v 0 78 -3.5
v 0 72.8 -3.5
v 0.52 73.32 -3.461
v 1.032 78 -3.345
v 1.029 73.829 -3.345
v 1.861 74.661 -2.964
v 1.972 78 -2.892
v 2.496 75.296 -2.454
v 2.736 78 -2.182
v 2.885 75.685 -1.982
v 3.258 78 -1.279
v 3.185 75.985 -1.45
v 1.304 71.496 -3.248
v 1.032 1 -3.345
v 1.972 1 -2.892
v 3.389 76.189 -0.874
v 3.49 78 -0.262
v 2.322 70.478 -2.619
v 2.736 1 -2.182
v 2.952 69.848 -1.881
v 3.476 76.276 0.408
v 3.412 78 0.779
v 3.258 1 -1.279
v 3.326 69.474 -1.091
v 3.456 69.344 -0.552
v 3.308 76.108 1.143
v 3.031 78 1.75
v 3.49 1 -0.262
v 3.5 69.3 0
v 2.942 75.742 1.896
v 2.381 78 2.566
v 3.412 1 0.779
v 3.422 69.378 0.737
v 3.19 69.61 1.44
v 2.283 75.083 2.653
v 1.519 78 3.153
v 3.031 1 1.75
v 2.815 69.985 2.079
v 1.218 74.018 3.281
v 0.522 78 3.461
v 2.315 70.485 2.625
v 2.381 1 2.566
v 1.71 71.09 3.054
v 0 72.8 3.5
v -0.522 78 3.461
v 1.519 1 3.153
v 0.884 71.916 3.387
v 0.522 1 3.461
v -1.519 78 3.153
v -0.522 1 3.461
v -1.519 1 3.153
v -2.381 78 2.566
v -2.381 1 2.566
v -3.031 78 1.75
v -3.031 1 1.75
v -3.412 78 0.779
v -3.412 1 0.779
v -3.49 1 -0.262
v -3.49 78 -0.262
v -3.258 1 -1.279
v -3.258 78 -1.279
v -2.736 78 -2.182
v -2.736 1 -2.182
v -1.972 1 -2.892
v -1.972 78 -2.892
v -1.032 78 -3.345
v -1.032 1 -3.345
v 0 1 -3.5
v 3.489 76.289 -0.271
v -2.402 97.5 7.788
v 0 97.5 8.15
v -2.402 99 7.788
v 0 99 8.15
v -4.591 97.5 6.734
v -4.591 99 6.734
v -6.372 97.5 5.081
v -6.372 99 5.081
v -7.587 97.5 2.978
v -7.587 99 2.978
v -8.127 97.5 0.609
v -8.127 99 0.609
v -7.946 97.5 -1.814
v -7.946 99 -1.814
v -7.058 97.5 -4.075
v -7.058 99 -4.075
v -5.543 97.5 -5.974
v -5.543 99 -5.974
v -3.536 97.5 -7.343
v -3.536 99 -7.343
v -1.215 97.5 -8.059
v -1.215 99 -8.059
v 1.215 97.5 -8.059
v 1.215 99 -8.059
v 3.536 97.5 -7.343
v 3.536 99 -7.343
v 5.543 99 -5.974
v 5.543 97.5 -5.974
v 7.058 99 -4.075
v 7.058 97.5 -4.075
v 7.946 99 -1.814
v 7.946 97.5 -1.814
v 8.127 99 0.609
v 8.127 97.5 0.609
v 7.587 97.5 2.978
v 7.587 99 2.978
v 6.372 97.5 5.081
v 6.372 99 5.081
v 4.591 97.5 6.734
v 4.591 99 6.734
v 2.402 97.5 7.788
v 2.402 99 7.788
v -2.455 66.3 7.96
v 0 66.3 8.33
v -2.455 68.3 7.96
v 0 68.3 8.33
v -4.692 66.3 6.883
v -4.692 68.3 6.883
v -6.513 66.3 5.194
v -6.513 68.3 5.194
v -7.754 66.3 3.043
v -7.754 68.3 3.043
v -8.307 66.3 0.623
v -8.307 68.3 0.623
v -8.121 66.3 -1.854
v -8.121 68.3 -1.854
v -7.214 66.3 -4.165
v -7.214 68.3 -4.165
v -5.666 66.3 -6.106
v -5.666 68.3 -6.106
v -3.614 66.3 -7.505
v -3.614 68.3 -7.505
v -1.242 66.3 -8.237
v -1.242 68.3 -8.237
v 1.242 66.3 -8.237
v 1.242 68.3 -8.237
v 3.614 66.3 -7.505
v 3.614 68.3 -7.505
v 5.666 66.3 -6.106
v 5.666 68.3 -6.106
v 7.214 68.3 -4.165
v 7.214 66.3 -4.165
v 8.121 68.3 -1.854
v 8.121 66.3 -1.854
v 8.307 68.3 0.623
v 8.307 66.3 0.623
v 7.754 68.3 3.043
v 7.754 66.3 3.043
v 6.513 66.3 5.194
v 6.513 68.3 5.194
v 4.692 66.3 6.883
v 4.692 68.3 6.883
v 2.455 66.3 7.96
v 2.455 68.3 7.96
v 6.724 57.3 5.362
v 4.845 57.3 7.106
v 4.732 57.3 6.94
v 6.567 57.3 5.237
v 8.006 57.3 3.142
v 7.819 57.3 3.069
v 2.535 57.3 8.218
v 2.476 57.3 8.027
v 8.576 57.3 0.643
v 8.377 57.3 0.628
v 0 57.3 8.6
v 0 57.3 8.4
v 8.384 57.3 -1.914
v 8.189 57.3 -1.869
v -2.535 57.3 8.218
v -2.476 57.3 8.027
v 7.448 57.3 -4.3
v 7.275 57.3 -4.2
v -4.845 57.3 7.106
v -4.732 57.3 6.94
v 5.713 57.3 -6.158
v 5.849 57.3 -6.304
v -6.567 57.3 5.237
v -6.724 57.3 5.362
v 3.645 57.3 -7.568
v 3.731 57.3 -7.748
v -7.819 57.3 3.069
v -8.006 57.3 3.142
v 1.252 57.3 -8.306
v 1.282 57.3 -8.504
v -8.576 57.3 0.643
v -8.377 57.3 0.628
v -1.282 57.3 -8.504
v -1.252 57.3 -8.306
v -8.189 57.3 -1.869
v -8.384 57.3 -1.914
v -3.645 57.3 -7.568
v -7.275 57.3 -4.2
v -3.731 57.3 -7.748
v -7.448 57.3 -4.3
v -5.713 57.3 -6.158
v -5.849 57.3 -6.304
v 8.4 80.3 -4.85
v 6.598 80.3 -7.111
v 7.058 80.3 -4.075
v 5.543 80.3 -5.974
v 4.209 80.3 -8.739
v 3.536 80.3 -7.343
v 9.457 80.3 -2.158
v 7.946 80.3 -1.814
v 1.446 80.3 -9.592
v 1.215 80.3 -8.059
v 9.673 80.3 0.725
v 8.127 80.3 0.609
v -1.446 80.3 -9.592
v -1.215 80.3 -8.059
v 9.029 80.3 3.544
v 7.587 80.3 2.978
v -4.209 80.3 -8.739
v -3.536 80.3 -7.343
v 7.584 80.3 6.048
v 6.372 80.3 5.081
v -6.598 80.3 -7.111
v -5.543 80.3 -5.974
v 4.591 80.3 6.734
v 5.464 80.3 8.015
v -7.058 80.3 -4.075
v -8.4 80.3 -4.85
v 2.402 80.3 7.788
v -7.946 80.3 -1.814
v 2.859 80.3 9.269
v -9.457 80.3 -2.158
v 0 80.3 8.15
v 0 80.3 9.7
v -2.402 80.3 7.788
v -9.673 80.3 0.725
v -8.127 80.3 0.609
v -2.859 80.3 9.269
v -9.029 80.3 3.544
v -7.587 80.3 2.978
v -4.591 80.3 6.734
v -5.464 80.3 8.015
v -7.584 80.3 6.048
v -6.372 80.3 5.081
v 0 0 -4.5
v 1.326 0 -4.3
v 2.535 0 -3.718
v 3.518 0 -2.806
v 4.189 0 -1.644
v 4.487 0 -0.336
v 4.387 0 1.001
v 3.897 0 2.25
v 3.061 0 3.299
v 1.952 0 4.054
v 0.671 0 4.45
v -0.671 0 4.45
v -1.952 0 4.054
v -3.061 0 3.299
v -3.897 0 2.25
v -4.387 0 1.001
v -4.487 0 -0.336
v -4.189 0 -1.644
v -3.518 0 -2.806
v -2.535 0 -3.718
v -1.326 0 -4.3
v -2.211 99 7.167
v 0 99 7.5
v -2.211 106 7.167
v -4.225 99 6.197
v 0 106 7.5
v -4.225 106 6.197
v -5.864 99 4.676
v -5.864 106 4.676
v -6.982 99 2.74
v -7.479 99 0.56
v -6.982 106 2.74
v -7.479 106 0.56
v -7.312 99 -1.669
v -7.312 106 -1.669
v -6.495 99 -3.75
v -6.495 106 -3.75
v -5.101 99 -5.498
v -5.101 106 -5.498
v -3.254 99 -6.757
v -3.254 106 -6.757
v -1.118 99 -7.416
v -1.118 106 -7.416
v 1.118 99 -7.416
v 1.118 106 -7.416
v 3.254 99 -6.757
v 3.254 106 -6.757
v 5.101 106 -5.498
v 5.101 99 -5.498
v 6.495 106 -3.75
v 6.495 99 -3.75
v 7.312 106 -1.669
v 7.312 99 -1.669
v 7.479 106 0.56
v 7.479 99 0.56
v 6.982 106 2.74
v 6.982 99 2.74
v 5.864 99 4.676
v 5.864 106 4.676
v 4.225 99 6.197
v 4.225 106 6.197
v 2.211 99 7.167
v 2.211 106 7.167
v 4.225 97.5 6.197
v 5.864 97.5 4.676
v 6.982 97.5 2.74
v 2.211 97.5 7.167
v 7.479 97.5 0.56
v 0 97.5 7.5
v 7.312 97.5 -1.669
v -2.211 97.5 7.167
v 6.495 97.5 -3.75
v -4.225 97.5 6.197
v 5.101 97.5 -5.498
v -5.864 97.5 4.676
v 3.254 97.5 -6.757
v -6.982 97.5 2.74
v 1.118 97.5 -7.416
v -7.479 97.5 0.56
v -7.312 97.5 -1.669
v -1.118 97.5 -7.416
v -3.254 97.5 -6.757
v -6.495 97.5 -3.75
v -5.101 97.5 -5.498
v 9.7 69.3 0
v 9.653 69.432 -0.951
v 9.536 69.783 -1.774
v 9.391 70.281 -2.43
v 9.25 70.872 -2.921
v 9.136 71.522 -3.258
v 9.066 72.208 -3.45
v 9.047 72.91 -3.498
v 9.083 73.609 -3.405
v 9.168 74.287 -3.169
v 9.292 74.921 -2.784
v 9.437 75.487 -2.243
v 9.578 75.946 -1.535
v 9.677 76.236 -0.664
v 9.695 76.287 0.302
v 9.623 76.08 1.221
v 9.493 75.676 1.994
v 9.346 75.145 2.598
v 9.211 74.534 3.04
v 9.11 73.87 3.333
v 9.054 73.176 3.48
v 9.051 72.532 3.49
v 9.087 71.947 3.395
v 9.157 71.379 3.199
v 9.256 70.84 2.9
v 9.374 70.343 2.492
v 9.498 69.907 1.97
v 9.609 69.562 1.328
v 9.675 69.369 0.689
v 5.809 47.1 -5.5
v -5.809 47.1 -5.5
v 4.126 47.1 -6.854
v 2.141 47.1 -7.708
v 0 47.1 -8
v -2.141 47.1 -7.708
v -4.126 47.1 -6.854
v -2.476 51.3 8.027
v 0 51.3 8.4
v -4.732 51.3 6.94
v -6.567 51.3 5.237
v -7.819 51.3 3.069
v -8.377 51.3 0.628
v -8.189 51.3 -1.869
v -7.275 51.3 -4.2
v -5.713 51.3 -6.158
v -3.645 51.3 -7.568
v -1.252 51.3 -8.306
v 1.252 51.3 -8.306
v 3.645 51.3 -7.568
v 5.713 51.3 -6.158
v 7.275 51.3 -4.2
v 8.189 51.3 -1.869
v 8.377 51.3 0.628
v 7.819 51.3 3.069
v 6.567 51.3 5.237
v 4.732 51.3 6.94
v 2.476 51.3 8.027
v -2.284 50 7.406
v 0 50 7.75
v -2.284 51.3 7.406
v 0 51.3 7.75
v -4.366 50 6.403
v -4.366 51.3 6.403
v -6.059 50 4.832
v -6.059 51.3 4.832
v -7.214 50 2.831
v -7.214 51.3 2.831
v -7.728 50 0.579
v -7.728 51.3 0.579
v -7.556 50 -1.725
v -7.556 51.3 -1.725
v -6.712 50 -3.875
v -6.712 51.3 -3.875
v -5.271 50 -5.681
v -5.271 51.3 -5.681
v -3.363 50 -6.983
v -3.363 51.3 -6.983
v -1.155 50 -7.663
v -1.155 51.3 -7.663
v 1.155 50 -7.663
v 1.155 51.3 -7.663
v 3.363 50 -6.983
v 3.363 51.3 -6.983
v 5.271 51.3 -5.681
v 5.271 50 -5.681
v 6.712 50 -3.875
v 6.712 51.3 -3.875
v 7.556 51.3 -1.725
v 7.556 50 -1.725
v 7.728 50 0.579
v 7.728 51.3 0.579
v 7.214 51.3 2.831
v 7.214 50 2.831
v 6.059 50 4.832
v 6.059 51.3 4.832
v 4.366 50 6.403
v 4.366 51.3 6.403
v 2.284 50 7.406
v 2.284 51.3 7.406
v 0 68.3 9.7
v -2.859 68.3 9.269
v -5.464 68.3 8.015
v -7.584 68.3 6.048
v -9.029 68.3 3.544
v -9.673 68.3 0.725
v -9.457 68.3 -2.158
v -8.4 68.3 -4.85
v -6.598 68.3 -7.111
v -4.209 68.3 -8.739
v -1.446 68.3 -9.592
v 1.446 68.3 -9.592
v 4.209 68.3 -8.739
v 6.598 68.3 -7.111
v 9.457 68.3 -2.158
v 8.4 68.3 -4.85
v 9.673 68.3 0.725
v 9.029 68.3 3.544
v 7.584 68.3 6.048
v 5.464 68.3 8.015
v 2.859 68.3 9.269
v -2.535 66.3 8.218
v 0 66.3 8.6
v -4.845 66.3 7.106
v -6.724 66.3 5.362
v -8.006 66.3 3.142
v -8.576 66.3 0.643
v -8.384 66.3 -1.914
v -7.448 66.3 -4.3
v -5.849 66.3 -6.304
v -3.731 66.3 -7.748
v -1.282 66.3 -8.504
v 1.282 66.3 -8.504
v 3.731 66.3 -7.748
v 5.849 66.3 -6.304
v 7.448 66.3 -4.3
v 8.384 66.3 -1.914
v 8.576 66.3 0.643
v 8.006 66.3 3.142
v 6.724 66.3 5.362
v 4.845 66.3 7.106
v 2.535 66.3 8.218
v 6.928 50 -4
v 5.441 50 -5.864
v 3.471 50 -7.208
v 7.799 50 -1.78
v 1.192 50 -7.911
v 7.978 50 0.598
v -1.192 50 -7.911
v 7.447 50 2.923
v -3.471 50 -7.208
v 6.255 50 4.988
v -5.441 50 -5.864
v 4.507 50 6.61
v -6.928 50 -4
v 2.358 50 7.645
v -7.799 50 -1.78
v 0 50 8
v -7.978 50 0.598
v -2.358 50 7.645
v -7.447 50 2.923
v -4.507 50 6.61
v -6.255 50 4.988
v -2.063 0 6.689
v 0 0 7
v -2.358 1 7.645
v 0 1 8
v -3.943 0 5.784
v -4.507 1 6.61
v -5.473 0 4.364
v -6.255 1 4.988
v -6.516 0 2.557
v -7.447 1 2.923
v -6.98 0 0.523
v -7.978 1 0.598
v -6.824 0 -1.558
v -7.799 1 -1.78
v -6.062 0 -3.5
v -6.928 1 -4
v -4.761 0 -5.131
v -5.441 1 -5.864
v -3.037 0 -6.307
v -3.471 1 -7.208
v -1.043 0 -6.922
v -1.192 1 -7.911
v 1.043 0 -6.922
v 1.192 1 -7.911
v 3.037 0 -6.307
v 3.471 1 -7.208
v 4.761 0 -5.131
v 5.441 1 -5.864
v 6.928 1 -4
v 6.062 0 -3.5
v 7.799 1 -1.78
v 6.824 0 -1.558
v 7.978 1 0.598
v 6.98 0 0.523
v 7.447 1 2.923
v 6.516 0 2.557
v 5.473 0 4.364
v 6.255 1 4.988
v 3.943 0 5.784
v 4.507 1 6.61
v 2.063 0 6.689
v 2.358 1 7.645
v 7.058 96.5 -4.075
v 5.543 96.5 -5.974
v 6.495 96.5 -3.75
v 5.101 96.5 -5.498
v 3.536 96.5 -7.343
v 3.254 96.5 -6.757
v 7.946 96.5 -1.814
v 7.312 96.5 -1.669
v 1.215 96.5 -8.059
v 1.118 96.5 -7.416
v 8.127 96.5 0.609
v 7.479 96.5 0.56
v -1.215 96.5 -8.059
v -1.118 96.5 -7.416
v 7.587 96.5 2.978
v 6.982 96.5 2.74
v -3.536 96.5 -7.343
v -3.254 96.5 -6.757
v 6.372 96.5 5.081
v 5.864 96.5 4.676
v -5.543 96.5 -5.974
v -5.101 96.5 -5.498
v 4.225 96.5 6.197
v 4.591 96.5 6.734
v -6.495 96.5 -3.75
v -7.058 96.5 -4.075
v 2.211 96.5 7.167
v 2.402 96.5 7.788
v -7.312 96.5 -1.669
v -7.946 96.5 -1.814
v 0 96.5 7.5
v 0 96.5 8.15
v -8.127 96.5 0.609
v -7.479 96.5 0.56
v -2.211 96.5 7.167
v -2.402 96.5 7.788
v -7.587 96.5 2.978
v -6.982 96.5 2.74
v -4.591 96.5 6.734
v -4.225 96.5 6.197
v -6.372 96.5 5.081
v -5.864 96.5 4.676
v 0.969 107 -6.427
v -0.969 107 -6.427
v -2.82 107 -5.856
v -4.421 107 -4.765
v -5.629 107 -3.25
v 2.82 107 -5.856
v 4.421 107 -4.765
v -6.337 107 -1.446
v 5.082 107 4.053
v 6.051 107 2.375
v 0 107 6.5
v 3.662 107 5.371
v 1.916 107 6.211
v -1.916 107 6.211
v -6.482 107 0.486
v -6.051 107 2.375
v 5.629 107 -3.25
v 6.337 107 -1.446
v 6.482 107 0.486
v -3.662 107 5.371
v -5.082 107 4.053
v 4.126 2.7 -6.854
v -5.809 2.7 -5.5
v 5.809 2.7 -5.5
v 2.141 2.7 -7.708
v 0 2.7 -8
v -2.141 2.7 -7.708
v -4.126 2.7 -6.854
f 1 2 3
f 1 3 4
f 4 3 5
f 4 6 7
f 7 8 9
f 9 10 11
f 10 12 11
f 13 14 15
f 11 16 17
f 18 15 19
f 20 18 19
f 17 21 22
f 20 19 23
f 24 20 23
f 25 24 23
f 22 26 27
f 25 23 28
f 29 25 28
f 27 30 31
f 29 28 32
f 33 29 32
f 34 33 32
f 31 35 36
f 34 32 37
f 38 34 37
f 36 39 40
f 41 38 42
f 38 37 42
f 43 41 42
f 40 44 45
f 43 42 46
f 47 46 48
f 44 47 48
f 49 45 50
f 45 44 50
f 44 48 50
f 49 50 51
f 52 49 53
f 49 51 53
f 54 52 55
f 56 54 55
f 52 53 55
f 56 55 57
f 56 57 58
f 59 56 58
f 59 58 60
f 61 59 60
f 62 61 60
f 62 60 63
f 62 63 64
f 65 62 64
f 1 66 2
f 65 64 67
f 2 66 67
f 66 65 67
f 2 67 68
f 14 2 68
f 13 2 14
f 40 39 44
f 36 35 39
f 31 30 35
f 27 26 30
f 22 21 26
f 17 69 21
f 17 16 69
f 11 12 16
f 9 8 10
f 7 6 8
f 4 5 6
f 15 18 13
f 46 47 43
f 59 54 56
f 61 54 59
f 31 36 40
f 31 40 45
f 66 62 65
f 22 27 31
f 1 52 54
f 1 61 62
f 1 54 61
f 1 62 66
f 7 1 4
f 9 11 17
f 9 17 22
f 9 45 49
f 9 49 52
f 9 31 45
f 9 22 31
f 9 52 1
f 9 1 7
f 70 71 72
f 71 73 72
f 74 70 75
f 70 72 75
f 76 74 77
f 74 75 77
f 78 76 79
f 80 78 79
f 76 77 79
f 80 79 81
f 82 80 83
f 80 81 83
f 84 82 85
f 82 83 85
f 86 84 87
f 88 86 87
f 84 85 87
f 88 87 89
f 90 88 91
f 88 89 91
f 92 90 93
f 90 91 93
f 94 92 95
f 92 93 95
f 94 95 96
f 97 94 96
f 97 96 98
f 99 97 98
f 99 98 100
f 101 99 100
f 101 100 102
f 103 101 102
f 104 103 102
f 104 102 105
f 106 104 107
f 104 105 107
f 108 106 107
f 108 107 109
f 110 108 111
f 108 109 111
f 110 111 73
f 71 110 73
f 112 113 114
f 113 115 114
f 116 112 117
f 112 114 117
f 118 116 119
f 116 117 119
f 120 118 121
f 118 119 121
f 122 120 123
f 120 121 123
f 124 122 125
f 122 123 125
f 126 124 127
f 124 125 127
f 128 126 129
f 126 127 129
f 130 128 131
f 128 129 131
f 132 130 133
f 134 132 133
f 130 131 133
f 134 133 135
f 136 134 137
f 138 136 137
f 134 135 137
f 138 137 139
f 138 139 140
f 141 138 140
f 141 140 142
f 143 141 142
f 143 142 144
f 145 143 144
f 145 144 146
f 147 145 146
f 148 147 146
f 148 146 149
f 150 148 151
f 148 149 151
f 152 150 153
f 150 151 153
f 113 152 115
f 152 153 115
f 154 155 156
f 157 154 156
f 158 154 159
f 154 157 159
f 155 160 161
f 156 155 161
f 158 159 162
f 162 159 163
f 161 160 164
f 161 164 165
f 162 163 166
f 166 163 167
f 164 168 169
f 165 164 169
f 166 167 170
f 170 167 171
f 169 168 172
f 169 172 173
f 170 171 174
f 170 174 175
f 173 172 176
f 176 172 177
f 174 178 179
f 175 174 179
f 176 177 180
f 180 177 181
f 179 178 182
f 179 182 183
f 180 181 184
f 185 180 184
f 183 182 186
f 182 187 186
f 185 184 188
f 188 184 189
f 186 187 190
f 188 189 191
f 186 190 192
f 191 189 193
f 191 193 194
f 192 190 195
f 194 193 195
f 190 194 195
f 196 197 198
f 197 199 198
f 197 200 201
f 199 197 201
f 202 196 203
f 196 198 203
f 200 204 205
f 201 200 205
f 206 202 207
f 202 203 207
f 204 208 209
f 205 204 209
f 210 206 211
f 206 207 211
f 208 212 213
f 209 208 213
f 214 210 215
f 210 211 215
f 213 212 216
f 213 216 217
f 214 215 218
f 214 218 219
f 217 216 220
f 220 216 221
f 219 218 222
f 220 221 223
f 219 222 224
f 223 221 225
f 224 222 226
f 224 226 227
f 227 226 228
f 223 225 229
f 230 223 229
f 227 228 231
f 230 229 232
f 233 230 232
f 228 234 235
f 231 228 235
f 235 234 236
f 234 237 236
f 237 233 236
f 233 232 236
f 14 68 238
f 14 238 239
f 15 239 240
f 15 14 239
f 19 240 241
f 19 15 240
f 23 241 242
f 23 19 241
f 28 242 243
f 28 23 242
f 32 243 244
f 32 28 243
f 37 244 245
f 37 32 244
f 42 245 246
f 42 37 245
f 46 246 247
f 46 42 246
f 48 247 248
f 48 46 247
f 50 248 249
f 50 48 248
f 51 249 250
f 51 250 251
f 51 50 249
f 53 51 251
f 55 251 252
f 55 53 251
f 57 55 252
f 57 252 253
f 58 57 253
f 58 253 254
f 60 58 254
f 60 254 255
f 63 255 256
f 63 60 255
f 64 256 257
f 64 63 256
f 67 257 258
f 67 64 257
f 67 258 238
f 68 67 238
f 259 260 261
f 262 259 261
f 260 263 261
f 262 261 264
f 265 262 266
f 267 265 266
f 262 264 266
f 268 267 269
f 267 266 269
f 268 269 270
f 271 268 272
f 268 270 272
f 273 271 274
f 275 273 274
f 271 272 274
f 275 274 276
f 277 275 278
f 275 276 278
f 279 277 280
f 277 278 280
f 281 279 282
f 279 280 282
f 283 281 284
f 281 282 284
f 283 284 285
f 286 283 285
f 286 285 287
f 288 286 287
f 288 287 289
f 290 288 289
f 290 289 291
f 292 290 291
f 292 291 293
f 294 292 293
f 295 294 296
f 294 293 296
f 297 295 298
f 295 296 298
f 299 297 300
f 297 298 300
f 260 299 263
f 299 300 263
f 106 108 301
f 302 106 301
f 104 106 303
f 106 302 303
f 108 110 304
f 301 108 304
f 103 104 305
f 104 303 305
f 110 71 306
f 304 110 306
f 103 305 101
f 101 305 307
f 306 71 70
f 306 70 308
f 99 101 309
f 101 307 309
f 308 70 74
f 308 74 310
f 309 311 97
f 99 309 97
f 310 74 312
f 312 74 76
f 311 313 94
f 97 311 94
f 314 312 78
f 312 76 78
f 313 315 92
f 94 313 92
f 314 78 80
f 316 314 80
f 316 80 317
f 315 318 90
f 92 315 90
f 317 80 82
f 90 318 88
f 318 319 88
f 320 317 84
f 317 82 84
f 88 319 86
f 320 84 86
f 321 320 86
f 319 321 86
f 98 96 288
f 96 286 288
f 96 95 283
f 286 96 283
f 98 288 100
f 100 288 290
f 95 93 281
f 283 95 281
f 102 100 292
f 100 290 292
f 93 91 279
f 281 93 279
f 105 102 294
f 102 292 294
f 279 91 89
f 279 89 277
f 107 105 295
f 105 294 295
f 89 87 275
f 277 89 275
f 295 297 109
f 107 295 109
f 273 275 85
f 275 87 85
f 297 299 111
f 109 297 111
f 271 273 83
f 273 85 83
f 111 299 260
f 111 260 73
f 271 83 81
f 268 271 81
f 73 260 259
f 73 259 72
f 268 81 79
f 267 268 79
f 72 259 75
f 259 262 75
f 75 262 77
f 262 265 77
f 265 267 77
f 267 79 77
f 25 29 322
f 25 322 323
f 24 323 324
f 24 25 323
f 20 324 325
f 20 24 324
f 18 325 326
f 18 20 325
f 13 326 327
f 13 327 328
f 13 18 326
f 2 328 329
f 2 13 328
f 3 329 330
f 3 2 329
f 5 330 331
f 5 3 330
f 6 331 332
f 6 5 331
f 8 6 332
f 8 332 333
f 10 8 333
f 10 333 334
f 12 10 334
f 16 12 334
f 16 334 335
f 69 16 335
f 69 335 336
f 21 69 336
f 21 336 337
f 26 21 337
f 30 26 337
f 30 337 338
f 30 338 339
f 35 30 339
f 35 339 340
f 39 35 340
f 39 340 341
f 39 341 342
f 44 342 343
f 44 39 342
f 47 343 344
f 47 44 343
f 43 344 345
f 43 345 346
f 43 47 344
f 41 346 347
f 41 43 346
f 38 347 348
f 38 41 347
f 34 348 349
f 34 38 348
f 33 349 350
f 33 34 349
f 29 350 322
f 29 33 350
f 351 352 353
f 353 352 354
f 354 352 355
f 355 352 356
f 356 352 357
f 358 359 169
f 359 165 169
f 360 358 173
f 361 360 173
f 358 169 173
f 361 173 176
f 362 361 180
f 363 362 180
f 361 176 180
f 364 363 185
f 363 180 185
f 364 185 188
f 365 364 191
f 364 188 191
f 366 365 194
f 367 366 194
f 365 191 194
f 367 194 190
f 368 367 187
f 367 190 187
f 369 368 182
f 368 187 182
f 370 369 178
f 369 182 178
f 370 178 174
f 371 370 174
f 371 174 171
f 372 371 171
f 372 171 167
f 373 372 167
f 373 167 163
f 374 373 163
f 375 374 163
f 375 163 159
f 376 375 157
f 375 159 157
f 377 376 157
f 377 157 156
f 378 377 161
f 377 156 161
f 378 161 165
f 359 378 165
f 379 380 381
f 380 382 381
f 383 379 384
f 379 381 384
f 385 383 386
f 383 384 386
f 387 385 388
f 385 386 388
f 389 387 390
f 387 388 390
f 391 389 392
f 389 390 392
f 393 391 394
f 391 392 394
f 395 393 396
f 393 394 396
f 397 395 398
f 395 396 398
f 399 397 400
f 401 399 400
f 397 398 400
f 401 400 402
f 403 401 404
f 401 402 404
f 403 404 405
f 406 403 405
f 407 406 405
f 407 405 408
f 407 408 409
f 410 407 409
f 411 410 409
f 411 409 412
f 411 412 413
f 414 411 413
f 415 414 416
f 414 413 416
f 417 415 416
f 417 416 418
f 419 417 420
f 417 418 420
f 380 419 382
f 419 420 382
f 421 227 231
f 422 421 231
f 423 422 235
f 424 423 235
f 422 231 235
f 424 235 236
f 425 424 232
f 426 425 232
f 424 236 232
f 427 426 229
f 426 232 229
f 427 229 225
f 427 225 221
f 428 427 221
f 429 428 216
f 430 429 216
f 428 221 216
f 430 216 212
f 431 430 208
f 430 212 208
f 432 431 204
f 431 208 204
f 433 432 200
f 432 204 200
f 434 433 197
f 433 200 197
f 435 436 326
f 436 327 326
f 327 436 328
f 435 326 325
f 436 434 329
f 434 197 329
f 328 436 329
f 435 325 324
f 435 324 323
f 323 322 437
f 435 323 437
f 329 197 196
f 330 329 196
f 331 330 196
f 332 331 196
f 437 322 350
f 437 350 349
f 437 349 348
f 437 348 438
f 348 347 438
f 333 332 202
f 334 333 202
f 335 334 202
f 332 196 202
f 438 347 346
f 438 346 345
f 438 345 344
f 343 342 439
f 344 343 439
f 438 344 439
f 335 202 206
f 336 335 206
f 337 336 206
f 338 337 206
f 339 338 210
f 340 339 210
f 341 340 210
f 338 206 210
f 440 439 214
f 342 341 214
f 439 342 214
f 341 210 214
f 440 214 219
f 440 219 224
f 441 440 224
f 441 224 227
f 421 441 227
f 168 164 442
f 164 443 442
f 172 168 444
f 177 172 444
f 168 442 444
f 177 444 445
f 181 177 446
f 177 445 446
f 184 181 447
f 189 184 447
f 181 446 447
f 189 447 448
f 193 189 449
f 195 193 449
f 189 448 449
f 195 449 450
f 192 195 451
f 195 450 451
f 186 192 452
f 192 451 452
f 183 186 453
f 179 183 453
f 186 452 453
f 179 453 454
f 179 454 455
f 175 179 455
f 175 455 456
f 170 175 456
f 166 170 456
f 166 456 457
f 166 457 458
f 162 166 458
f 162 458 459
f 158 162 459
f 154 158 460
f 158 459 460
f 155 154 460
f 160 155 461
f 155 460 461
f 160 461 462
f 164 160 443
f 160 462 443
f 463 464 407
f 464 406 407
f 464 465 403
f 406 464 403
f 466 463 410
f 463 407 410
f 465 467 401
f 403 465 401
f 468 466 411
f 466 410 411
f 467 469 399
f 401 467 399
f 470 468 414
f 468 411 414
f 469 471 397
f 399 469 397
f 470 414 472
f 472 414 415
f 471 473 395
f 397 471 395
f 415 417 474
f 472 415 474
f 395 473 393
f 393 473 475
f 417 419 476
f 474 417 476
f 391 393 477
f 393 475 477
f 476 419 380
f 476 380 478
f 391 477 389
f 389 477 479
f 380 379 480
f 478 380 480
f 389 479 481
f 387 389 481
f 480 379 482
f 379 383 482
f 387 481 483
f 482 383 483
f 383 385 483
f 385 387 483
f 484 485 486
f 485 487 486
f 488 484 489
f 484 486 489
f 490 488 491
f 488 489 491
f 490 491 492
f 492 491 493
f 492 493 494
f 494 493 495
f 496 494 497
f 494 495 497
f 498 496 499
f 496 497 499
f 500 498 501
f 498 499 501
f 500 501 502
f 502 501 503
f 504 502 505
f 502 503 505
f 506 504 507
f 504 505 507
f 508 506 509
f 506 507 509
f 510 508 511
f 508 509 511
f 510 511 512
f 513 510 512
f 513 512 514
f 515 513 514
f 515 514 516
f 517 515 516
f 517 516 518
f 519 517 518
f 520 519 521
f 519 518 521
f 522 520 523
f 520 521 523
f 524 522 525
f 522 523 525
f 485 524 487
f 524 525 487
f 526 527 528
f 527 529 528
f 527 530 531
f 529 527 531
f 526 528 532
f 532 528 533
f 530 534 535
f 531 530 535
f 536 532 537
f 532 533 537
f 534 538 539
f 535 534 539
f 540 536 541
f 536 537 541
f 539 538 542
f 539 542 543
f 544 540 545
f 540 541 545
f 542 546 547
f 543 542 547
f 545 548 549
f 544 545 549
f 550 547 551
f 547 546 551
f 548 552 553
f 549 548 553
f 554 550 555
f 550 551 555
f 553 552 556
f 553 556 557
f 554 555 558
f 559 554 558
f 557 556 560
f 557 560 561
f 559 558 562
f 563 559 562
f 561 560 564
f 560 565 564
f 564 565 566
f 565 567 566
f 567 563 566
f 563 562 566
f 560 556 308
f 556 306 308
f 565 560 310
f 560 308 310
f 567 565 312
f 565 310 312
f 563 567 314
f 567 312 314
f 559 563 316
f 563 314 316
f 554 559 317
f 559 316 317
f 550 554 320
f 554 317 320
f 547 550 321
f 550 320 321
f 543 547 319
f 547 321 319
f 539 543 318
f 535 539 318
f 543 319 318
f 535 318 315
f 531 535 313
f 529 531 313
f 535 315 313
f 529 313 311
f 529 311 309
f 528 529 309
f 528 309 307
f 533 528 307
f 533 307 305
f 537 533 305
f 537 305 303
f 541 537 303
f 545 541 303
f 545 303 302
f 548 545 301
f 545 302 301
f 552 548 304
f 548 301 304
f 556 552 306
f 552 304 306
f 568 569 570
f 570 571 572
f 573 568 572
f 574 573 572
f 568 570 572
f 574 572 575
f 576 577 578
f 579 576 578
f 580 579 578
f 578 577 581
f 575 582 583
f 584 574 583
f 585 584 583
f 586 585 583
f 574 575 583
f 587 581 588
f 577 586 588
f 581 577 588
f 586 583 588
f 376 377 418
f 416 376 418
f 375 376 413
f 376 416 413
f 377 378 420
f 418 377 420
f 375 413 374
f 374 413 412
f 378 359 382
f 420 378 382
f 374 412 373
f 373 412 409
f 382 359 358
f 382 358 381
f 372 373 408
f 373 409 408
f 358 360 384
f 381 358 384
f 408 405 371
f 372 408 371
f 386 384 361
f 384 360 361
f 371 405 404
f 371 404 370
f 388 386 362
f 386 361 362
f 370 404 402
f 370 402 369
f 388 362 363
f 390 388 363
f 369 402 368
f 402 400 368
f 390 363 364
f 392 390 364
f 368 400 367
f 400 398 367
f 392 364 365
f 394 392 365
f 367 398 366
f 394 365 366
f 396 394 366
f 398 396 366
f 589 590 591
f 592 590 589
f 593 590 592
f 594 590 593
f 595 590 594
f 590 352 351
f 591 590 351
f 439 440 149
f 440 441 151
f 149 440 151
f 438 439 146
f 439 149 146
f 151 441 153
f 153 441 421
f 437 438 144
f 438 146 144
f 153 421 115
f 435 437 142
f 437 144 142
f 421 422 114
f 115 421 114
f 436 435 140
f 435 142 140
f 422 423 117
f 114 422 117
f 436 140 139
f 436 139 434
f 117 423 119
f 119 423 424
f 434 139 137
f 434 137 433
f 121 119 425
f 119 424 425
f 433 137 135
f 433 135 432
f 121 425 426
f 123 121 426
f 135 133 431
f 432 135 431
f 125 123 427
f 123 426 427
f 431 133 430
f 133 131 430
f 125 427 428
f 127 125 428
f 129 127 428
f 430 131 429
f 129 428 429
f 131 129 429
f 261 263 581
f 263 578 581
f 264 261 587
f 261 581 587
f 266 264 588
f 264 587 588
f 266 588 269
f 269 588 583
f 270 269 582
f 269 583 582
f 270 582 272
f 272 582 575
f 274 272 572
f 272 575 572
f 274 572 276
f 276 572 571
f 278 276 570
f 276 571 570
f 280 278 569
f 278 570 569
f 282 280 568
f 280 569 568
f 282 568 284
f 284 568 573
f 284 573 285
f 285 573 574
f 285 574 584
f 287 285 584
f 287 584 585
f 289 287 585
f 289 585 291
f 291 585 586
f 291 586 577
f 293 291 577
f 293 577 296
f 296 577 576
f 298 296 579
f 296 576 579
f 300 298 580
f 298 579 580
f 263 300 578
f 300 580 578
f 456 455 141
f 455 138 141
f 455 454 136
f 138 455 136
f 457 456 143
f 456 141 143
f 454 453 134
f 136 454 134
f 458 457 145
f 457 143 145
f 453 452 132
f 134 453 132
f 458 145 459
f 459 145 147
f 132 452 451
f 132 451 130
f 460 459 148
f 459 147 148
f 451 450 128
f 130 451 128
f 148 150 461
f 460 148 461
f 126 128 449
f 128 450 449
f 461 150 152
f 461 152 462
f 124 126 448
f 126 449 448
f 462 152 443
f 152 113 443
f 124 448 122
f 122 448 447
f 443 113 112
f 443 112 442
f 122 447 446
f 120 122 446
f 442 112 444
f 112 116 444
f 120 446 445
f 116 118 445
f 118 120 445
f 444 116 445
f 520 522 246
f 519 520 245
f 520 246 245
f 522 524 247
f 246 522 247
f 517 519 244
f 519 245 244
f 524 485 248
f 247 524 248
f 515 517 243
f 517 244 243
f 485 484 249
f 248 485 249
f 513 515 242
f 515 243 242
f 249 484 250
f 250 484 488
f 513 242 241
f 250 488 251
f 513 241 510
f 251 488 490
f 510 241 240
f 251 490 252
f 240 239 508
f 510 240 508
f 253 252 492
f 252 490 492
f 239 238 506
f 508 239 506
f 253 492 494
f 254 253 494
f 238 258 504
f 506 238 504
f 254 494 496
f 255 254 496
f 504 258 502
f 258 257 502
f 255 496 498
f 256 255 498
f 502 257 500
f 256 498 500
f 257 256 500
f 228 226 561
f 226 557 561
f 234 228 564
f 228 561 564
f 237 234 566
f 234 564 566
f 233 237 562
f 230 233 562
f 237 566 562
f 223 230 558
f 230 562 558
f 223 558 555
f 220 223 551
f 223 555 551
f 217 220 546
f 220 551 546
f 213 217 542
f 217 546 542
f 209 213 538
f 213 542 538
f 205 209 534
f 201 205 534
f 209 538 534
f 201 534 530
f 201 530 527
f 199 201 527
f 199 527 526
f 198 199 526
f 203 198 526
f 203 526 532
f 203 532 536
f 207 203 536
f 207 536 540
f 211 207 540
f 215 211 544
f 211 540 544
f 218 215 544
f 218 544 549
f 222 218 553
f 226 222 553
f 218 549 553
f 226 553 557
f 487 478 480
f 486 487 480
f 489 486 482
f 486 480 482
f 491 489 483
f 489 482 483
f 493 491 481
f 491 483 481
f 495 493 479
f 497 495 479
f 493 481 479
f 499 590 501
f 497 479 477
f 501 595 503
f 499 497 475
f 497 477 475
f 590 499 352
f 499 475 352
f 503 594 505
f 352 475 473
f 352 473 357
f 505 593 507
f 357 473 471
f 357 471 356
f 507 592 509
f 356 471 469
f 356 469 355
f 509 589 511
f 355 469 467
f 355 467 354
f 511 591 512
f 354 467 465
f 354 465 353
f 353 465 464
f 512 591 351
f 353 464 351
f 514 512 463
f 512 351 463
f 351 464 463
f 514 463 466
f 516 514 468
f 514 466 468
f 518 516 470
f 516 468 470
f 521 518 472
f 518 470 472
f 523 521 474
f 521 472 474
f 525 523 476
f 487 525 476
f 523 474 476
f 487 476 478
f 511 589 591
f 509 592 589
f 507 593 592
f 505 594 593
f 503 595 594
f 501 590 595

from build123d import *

# Parameters (mm, degrees)
ENL_V_START             = -5.5
ESQUISSE2_W             = 11.618950038
ESQUISSE2_H             = 44.4
ENL_V_MAT_EXTRU_1_DEPTH = 103.375761874
ENL_V_MAT_EXTRU_2_DEPTH = 108.875761874
ESQUISSE6_R             = 3.5
ENL_V_MAT_EXTRU_3_DEPTH = 78
CHANFREIN1_SIZE         = 1


with BuildPart() as part:
    # Esquisse1 → Révolution1 (revolve)
    with BuildSketch(Plane.XY, mode=Mode.PRIVATE) as r_volution1_sk:
        Polygon((0, 0), (-7, 0), (-8, 1), (-8, 50), (-7.75, 50), (-7.75, 51.3), (-8.4, 51.3), (-8.4, 57.3), (-8.6, 57.3), (-8.6, 66.3), (-8.33, 66.3), (-8.33, 68.3), (-9.7, 68.3), (-9.7, 80.3), (-8.15, 80.3), (-8.15, 96.5), (-7.5, 96.5), (-7.5, 97.5), (-8.15, 97.5), (-8.15, 99), (-7.5, 99), (-7.5, 106), (-6.5, 107), (0, 107), align=None)
    revolve(r_volution1_sk.sketch.rotate(Axis((0, 107, 0), (0, -1, 0)), 270), axis=Axis((0, 107, 0), (0, -1, 0)))

    # Esquisse2 → Enlèv. mat.-Extru.1 (cut, through all)
    with BuildSketch(Plane.XY.offset(ENL_V_START)):
        with Locations((0, 24.9)):
            Rectangle(ESQUISSE2_W, ESQUISSE2_H)
    extrude(amount=-ENL_V_MAT_EXTRU_1_DEPTH, mode=Mode.SUBTRACT)

    # Esquisse5 → Enlèv. mat.-Extru.2 (cut, through all)
    with BuildSketch(Plane(origin=(0, 0, 0), x_dir=(0, 0, -1), z_dir=(1, 0, 0))):
        with BuildLine():
            ThreePointArc((0, 76.3), (-3.5, 72.8), (0, 69.3))
            ThreePointArc((0, 69.3), (3.5, 72.8), (0, 76.3))
        make_face()
    extrude(amount=ENL_V_MAT_EXTRU_2_DEPTH, mode=Mode.SUBTRACT)

    # Esquisse6 → Enlèv. mat.-Extru.3 (cut)
    with BuildSketch(Plane.XZ):
        with Locations(Location((0, 0, 0), (0, 0, 270))):
            Circle(ESQUISSE6_R)
    extrude(amount=-ENL_V_MAT_EXTRU_3_DEPTH, mode=Mode.SUBTRACT)

    # Chanfrein1
    chanfrein1_edges = [part.edges().sort_by_distance(p)[0] for p in [
        (0, 0, 3.5),
    ]]
    chamfer(chanfrein1_edges, length=CHANFREIN1_SIZE)


solid = part.part
